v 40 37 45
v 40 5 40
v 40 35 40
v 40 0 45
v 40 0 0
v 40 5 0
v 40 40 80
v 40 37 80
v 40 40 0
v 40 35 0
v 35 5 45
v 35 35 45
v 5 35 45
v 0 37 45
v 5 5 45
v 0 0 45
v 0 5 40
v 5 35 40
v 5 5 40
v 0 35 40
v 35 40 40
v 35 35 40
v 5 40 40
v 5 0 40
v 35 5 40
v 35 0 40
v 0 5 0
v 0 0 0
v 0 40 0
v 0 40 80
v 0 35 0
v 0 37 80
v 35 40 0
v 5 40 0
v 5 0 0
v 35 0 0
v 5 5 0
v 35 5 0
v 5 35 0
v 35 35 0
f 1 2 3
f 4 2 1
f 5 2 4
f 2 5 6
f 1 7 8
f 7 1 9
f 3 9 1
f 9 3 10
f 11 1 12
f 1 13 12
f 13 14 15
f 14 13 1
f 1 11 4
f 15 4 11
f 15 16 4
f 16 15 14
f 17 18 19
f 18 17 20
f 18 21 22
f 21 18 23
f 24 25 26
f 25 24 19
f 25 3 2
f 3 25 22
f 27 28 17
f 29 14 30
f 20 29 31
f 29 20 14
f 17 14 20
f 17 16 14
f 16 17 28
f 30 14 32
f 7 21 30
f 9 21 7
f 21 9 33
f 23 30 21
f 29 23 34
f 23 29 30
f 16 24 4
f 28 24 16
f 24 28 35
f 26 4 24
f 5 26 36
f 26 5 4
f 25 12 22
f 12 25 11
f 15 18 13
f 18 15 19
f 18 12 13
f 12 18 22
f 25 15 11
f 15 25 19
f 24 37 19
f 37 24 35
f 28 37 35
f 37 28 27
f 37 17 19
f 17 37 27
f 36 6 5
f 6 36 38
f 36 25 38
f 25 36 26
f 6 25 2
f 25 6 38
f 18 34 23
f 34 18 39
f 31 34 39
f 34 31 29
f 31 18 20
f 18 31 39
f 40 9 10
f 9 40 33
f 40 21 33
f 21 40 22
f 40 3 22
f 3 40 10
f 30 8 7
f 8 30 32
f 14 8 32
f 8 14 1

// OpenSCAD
// Chair model

// Parameters
chair_width = 40;  // Width of the chair
chair_depth = 40;  // Depth of the chair
chair_height = 80; // Height of the chair
seat_height = 45;  // Height of the seat
leg_thickness = 5; // Thickness of the legs
back_height = 35;  // Height of the backrest
back_thickness = 3; // Thickness of the backrest

// Module for a single leg
module leg() {
    cube([leg_thickness, leg_thickness, seat_height]);
}

// Module for the seat
module seat() {
    difference() {
        cube([chair_width, chair_depth, leg_thickness]);
        translate([leg_thickness, leg_thickness, -0.1])
        cube([chair_width-2*leg_thickness, chair_depth-2*leg_thickness, leg_thickness+0.2]);
    }
}

// Module for the backrest
module backrest() {
    translate([0, chair_depth - back_thickness, seat_height])
    cube([chair_width, back_thickness, back_height]);
}

// Main chair module
module chair() {
    // Legs
    translate([0, 0, 0]) leg();
    translate([chair_width - leg_thickness, 0, 0]) leg();
    translate([0, chair_depth - leg_thickness, 0]) leg();
    translate([chair_width - leg_thickness, chair_depth - leg_thickness, 0]) leg();

    // Seat
    translate([0, 0, seat_height - leg_thickness]) seat();

    // Backrest
    backrest();
}

// Render the chair
chair();
